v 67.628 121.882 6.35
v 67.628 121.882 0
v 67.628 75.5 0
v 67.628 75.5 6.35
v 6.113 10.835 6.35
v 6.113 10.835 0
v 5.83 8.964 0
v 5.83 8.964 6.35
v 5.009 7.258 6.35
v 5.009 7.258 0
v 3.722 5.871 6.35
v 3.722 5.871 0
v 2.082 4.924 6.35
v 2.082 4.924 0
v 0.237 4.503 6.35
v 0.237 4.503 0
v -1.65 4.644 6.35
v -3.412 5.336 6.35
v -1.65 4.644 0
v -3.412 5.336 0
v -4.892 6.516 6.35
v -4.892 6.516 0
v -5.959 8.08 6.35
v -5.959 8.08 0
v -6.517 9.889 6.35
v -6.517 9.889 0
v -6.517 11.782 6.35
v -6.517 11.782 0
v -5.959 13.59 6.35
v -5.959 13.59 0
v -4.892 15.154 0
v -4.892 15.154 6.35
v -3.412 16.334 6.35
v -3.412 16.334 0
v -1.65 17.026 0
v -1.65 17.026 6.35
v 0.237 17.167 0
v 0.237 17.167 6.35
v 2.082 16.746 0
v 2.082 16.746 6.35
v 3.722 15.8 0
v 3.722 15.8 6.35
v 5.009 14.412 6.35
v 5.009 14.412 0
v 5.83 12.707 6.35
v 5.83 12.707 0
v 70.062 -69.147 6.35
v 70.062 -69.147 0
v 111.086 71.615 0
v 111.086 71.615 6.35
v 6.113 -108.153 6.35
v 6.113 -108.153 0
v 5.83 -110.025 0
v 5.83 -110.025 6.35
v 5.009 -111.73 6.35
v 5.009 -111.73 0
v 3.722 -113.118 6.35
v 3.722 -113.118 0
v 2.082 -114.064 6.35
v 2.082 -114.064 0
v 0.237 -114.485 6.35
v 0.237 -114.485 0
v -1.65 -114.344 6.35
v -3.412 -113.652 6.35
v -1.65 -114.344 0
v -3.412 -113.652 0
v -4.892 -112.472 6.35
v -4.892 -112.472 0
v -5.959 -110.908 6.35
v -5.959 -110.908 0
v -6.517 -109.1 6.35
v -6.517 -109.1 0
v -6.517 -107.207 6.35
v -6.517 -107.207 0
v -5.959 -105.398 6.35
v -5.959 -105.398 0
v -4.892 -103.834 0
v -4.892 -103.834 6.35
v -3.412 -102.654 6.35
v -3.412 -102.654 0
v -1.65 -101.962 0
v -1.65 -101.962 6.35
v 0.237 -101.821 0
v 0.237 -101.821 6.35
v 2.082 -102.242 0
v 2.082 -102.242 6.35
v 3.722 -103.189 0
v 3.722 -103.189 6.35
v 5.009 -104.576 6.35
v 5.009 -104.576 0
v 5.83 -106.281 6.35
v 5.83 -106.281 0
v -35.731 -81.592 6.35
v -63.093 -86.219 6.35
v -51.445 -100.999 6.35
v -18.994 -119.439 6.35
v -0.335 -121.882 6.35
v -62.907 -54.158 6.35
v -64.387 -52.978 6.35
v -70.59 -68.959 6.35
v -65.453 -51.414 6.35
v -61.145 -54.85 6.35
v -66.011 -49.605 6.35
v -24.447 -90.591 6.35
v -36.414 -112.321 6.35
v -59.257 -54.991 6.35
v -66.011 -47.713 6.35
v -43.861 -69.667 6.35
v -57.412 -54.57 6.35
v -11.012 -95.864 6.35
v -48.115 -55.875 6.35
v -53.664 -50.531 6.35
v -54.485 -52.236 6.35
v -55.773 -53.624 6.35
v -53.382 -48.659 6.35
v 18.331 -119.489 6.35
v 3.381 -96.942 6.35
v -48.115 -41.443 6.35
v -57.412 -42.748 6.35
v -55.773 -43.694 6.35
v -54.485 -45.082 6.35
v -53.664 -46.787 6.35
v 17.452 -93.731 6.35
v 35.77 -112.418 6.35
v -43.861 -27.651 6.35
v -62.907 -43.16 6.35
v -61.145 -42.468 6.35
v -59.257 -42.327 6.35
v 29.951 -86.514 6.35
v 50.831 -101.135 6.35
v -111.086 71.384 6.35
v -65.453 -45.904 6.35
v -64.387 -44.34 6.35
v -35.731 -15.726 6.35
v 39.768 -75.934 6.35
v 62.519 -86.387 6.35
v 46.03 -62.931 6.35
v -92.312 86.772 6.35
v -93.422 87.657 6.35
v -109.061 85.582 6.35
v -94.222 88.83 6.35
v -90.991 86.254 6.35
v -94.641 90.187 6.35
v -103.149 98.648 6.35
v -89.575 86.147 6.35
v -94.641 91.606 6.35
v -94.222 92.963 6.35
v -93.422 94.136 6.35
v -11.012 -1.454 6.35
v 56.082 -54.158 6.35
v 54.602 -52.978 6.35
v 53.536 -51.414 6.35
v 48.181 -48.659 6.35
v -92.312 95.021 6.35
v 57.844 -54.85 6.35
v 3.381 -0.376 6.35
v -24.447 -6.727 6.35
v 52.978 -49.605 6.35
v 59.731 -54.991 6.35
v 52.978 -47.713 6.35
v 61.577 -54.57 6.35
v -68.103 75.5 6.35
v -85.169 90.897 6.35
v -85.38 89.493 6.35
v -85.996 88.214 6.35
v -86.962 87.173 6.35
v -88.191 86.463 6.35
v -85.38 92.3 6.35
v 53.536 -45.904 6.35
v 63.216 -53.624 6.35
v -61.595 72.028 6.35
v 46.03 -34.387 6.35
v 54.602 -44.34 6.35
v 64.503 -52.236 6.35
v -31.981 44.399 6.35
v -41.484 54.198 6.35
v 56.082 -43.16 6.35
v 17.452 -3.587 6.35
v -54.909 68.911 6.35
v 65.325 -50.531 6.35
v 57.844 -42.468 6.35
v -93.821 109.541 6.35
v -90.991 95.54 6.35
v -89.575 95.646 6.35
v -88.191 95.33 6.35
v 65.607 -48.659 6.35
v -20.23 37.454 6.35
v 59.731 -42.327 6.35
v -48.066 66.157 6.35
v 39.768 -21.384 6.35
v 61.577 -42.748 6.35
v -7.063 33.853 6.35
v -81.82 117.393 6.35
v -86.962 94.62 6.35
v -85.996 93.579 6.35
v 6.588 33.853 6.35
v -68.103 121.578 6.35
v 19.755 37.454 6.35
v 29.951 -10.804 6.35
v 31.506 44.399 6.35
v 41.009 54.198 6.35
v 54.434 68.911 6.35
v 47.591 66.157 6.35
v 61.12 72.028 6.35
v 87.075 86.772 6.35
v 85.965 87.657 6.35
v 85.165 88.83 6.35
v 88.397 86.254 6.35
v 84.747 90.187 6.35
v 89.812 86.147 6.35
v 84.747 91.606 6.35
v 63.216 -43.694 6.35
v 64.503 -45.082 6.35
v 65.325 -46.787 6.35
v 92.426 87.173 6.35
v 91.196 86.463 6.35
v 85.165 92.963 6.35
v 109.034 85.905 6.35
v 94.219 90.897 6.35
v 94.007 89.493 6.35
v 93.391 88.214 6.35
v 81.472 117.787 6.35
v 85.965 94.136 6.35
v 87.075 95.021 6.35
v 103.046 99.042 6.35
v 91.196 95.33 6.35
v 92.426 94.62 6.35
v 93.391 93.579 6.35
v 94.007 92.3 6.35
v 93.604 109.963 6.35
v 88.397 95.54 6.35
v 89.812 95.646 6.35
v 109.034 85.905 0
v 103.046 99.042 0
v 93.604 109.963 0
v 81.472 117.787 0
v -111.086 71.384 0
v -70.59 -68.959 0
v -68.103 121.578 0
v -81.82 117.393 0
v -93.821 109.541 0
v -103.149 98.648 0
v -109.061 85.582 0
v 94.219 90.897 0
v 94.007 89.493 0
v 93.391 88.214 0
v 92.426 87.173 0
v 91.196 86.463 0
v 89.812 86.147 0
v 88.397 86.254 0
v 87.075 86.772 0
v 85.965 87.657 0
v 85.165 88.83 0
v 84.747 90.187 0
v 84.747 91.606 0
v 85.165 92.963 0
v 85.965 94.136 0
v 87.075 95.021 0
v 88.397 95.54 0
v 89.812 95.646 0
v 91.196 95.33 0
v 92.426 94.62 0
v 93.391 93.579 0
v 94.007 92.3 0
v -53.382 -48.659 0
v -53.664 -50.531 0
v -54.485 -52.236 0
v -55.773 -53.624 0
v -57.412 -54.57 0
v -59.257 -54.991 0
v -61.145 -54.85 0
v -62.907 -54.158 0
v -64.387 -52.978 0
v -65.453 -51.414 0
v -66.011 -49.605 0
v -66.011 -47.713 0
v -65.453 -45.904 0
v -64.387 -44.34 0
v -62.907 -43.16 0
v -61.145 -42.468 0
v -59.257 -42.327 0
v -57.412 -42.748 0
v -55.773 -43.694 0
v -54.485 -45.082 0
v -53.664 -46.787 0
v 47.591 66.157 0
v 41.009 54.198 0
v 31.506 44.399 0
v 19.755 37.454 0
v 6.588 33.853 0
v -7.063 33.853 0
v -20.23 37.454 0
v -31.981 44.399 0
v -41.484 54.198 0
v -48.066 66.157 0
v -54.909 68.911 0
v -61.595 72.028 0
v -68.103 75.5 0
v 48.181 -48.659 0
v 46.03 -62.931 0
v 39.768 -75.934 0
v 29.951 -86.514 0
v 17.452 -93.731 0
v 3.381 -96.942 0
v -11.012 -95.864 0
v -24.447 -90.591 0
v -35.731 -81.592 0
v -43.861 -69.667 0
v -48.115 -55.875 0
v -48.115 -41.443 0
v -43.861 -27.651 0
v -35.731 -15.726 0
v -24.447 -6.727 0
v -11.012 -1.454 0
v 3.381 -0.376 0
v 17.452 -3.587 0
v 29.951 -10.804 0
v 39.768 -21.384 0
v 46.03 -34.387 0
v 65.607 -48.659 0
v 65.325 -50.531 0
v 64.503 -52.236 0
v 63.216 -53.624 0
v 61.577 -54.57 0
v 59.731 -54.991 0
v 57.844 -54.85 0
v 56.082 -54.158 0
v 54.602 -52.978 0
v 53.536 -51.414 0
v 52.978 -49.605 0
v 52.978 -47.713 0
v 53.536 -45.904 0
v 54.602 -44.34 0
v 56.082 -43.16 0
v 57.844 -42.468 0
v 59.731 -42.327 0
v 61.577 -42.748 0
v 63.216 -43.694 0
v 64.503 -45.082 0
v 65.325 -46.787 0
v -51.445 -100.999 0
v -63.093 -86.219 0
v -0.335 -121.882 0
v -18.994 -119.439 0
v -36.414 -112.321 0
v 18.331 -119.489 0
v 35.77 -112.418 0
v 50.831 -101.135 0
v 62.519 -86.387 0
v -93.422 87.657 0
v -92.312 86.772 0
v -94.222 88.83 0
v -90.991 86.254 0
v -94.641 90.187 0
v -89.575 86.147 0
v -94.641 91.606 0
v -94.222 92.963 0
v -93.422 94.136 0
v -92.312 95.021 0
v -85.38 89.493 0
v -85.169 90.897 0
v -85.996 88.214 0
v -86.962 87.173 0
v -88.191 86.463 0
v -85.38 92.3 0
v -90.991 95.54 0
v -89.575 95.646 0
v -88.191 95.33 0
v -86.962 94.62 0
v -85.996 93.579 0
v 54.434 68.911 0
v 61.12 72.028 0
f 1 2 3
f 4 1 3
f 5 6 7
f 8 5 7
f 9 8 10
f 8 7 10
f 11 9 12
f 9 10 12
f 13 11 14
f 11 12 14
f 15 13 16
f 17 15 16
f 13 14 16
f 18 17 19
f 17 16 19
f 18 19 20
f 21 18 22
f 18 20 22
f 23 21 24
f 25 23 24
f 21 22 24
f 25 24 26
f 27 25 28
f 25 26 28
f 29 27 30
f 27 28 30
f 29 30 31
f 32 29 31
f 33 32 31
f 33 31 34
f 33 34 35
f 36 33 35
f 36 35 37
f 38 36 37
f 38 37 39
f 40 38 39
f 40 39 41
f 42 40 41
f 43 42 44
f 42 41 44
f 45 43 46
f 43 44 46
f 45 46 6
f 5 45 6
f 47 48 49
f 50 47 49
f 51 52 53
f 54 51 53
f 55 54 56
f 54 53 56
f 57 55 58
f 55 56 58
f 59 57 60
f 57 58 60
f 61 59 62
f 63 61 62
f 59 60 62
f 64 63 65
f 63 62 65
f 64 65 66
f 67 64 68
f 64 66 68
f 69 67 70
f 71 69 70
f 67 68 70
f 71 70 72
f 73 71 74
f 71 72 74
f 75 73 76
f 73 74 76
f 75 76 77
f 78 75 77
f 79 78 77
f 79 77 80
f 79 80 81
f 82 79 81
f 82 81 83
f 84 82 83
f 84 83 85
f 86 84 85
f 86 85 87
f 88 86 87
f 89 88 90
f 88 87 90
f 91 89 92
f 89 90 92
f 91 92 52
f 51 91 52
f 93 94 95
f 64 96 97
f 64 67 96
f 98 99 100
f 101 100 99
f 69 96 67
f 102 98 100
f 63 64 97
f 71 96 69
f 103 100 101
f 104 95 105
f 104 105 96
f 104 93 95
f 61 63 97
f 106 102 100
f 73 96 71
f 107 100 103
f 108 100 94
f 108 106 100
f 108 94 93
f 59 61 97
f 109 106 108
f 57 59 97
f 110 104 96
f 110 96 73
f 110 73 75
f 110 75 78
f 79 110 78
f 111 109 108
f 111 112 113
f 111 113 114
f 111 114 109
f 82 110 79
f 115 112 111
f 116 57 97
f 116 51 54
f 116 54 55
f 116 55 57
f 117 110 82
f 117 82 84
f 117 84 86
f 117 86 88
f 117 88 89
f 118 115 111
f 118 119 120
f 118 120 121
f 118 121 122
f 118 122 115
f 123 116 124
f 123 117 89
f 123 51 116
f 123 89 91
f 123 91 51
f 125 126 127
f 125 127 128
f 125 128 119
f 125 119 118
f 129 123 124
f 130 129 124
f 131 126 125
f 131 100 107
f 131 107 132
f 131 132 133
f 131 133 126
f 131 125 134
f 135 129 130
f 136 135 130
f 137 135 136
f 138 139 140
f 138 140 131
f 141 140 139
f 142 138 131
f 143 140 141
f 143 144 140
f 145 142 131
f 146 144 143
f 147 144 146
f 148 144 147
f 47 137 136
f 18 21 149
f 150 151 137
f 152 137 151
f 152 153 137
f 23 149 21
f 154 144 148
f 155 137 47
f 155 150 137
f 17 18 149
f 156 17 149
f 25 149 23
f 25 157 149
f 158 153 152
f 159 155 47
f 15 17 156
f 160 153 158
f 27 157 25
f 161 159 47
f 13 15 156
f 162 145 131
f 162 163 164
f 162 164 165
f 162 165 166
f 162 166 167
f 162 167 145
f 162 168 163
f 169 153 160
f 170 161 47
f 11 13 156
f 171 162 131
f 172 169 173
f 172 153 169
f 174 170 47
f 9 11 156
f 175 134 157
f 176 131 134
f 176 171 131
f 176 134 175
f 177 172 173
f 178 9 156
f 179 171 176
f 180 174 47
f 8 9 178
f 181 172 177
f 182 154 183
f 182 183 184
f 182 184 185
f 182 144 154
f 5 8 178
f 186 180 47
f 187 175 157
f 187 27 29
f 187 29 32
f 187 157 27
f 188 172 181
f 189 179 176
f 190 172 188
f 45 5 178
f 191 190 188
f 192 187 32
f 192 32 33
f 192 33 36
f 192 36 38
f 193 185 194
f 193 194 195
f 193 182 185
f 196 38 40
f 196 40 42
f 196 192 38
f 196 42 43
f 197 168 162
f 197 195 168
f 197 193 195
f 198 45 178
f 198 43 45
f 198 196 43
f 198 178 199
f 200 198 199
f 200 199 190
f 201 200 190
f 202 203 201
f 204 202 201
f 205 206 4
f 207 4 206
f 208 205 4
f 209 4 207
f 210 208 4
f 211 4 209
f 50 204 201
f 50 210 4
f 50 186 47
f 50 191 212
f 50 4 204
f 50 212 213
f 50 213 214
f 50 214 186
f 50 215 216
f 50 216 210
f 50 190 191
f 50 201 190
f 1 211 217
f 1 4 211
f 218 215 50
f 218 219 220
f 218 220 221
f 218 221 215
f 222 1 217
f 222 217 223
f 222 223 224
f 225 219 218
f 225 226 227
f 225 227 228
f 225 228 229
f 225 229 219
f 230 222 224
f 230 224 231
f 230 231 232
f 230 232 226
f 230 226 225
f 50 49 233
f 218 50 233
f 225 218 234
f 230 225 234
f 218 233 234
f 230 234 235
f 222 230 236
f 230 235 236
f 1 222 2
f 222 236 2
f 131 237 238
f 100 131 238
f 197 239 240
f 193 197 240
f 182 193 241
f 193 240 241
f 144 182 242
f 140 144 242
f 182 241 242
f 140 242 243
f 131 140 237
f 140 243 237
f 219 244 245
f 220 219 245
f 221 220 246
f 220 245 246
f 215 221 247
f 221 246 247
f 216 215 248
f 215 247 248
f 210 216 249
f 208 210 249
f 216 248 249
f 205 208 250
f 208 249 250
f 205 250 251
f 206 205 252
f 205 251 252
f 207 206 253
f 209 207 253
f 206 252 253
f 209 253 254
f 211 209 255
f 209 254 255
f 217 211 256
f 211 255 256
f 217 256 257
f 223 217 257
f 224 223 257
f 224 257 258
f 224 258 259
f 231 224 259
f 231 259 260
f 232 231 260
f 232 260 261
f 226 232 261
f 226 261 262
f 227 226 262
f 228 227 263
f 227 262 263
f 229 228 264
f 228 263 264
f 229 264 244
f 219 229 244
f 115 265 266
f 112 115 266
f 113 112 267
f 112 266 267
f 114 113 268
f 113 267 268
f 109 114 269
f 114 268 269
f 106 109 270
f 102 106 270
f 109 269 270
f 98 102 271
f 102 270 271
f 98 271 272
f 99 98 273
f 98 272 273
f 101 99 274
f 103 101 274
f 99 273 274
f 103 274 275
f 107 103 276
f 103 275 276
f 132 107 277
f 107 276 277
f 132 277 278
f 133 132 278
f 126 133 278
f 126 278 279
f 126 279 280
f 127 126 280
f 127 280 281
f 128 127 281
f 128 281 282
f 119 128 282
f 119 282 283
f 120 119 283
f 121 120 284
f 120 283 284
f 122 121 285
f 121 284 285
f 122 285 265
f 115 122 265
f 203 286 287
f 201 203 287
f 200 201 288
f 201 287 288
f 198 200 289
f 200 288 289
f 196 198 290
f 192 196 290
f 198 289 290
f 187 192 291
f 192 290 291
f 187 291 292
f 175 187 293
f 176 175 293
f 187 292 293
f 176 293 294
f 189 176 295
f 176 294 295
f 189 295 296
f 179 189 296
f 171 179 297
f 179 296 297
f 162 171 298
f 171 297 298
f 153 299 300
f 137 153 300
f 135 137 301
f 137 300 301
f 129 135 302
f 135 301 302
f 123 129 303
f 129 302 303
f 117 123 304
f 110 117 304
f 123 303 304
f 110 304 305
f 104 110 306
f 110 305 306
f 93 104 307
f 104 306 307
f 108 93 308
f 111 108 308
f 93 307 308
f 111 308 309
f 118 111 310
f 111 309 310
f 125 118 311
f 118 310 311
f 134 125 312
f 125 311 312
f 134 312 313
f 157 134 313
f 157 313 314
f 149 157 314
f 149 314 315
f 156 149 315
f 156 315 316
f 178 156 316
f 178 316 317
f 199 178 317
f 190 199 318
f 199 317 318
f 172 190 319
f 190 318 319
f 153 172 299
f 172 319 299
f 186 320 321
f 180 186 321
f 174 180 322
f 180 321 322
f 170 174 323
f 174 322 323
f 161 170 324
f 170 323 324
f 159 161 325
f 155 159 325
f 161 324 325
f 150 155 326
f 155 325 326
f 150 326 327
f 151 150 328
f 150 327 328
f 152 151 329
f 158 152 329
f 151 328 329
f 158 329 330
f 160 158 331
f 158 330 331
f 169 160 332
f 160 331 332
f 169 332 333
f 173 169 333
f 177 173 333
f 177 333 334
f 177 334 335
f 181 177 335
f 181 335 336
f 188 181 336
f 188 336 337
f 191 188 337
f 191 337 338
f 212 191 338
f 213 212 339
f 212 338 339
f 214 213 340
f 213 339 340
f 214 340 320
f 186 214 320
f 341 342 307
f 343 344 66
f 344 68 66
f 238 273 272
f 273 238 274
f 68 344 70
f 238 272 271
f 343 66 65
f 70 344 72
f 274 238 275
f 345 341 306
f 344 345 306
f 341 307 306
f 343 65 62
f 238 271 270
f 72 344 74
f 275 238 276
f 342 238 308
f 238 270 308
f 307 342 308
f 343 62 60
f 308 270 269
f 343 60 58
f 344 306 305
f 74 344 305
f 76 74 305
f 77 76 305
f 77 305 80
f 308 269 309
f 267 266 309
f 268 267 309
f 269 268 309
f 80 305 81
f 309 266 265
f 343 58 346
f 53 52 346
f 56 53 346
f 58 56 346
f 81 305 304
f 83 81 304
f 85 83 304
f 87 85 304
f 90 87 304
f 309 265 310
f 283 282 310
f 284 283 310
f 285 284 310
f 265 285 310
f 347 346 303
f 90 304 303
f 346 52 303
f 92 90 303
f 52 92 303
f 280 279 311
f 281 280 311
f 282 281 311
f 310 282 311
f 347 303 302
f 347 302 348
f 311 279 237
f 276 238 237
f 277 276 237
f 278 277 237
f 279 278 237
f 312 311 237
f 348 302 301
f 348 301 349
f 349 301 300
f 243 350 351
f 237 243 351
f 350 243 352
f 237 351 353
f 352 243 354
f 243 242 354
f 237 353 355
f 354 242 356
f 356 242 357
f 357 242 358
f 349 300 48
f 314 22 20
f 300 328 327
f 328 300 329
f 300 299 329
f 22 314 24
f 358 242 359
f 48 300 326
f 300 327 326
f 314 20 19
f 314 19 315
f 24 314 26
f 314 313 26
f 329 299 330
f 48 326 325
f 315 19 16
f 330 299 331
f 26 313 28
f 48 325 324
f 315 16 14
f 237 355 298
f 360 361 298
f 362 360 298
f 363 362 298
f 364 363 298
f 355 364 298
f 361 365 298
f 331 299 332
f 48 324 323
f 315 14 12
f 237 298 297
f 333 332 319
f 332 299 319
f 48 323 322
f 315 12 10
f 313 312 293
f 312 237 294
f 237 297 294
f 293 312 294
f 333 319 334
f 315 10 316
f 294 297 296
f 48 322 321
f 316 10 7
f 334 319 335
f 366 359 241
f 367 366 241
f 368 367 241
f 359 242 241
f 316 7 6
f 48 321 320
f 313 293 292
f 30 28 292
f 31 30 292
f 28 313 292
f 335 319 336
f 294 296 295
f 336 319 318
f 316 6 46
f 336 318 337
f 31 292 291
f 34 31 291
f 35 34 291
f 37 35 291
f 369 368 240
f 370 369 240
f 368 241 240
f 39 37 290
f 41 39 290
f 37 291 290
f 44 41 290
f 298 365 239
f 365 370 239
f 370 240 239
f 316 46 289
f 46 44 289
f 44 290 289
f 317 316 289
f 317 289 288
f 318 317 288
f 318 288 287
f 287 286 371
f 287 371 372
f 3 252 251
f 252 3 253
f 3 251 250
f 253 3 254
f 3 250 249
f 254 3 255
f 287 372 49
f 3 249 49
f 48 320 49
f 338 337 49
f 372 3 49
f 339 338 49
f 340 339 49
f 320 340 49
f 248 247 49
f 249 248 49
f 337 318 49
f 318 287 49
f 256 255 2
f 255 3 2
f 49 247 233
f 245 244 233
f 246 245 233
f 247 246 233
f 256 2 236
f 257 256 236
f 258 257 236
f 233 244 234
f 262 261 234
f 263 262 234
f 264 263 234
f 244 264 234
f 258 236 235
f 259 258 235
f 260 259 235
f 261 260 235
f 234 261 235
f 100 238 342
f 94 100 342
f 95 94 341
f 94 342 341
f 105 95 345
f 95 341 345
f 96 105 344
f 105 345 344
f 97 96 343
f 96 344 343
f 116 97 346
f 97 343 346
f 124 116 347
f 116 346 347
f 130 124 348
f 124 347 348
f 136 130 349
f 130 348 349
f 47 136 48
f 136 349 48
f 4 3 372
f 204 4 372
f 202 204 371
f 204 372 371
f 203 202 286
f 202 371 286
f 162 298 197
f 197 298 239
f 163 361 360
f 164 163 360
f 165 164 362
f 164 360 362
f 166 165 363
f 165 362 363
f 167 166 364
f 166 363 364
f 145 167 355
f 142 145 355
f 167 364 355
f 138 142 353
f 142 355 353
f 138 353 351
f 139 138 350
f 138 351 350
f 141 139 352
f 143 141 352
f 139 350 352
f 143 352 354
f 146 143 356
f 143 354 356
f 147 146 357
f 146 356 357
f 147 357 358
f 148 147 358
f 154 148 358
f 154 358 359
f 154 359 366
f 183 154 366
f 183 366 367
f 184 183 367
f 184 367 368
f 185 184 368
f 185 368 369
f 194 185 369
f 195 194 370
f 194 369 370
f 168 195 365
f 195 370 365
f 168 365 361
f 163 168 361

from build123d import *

# Parameters (mm, degrees)
F1_DEPTH = 6.35


# Not quite as in the source:
# - ends of sketch curves that miss each other by under 0.0002 mm in the source are joined


with BuildPart() as f1:
    # F0 (on Top) → F1 (new body)
    with BuildSketch(Plane.XY):
        with BuildLine():
            Line((-111.08563, 71.3839822), (-70.59041, -68.9586378))
            ThreePointArc((-70.59041, -68.9586378), (-0.3347578994, -121.8821648179), (70.0620962947, -69.1465996345))
            Line((70.0620962947, -69.1465996345), (111.08563, 71.6151222))
            ThreePointArc((111.08563, 71.6151222), (98.7152655637, 104.8392134799), (67.6282616967, 121.882228124))
            Line((67.6282616967, 121.882228124), (67.628262, 75.5002554))
            ThreePointArc((67.628262, 75.5002554), (57.7977885358, 70.4247346397), (47.5906584666, 66.156994374))
            ThreePointArc((47.5906584666, 66.156994374), (-0.23749, 33.3973424), (-48.0656463013, 66.1569896482))
            ThreePointArc((-48.0656463013, 66.1569896482), (-58.2727685358, 70.4247346397), (-68.1032374015, 75.5002634895))
            Line((-68.1032374015, 75.5002634895), (-68.103242, 121.5776334))
            ThreePointArc((-68.103242, 121.5776334), (-98.8713942195, 104.4249578962), (-111.08563, 71.3839822))
        make_face()
        with BuildLine():
            ThreePointArc((-6.58749, -108.1531492), (-0.23749, -101.8031492), (6.11251, -108.1531492))
            ThreePointArc((6.11251, -108.1531492), (-0.23749, -114.5031492), (-6.58749, -108.1531492))
        make_face(mode=Mode.SUBTRACT)
        with BuildLine():
            ThreePointArc((-66.0816814, -48.6589578), (-59.7316814, -42.3089578), (-53.3816814, -48.6589578))
            ThreePointArc((-53.3816814, -48.6589578), (-59.7316814, -55.0089578), (-66.0816814, -48.6589578))
        make_face(mode=Mode.SUBTRACT)
        with BuildLine():
            ThreePointArc((-48.65624, -48.6589578), (-0.23749, -0.2402078), (48.18126, -48.6589578))
            ThreePointArc((48.18126, -48.6589578), (-0.23749, -97.0777078), (-48.65624, -48.6589578))
        make_face(mode=Mode.SUBTRACT)
        with BuildLine():
            ThreePointArc((52.9067014, -48.6589578), (59.2567014, -42.3089578), (65.6067014, -48.6589578))
            ThreePointArc((65.6067014, -48.6589578), (59.2567014, -55.0089578), (52.9067014, -48.6589578))
        make_face(mode=Mode.SUBTRACT)
        with BuildLine():
            ThreePointArc((-6.58749, 10.8352336), (-0.23749, 17.1852336), (6.11251, 10.8352336))
            ThreePointArc((6.11251, 10.8352336), (-0.23749, 4.4852336), (-6.58749, 10.8352336))
        make_face(mode=Mode.SUBTRACT)
        with BuildLine():
            ThreePointArc((-94.69374, 90.8966432), (-89.93124, 95.6591432), (-85.16874, 90.8966432))
            ThreePointArc((-85.16874, 90.8966432), (-89.93124, 86.1341432), (-94.69374, 90.8966432))
        make_face(mode=Mode.SUBTRACT)
        with BuildLine():
            ThreePointArc((84.69376, 90.8966432), (89.45626, 95.6591432), (94.21876, 90.8966432))
            ThreePointArc((94.21876, 90.8966432), (89.45626, 86.1341432), (84.69376, 90.8966432))
        make_face(mode=Mode.SUBTRACT)
    extrude(amount=F1_DEPTH)


solid = f1.part
